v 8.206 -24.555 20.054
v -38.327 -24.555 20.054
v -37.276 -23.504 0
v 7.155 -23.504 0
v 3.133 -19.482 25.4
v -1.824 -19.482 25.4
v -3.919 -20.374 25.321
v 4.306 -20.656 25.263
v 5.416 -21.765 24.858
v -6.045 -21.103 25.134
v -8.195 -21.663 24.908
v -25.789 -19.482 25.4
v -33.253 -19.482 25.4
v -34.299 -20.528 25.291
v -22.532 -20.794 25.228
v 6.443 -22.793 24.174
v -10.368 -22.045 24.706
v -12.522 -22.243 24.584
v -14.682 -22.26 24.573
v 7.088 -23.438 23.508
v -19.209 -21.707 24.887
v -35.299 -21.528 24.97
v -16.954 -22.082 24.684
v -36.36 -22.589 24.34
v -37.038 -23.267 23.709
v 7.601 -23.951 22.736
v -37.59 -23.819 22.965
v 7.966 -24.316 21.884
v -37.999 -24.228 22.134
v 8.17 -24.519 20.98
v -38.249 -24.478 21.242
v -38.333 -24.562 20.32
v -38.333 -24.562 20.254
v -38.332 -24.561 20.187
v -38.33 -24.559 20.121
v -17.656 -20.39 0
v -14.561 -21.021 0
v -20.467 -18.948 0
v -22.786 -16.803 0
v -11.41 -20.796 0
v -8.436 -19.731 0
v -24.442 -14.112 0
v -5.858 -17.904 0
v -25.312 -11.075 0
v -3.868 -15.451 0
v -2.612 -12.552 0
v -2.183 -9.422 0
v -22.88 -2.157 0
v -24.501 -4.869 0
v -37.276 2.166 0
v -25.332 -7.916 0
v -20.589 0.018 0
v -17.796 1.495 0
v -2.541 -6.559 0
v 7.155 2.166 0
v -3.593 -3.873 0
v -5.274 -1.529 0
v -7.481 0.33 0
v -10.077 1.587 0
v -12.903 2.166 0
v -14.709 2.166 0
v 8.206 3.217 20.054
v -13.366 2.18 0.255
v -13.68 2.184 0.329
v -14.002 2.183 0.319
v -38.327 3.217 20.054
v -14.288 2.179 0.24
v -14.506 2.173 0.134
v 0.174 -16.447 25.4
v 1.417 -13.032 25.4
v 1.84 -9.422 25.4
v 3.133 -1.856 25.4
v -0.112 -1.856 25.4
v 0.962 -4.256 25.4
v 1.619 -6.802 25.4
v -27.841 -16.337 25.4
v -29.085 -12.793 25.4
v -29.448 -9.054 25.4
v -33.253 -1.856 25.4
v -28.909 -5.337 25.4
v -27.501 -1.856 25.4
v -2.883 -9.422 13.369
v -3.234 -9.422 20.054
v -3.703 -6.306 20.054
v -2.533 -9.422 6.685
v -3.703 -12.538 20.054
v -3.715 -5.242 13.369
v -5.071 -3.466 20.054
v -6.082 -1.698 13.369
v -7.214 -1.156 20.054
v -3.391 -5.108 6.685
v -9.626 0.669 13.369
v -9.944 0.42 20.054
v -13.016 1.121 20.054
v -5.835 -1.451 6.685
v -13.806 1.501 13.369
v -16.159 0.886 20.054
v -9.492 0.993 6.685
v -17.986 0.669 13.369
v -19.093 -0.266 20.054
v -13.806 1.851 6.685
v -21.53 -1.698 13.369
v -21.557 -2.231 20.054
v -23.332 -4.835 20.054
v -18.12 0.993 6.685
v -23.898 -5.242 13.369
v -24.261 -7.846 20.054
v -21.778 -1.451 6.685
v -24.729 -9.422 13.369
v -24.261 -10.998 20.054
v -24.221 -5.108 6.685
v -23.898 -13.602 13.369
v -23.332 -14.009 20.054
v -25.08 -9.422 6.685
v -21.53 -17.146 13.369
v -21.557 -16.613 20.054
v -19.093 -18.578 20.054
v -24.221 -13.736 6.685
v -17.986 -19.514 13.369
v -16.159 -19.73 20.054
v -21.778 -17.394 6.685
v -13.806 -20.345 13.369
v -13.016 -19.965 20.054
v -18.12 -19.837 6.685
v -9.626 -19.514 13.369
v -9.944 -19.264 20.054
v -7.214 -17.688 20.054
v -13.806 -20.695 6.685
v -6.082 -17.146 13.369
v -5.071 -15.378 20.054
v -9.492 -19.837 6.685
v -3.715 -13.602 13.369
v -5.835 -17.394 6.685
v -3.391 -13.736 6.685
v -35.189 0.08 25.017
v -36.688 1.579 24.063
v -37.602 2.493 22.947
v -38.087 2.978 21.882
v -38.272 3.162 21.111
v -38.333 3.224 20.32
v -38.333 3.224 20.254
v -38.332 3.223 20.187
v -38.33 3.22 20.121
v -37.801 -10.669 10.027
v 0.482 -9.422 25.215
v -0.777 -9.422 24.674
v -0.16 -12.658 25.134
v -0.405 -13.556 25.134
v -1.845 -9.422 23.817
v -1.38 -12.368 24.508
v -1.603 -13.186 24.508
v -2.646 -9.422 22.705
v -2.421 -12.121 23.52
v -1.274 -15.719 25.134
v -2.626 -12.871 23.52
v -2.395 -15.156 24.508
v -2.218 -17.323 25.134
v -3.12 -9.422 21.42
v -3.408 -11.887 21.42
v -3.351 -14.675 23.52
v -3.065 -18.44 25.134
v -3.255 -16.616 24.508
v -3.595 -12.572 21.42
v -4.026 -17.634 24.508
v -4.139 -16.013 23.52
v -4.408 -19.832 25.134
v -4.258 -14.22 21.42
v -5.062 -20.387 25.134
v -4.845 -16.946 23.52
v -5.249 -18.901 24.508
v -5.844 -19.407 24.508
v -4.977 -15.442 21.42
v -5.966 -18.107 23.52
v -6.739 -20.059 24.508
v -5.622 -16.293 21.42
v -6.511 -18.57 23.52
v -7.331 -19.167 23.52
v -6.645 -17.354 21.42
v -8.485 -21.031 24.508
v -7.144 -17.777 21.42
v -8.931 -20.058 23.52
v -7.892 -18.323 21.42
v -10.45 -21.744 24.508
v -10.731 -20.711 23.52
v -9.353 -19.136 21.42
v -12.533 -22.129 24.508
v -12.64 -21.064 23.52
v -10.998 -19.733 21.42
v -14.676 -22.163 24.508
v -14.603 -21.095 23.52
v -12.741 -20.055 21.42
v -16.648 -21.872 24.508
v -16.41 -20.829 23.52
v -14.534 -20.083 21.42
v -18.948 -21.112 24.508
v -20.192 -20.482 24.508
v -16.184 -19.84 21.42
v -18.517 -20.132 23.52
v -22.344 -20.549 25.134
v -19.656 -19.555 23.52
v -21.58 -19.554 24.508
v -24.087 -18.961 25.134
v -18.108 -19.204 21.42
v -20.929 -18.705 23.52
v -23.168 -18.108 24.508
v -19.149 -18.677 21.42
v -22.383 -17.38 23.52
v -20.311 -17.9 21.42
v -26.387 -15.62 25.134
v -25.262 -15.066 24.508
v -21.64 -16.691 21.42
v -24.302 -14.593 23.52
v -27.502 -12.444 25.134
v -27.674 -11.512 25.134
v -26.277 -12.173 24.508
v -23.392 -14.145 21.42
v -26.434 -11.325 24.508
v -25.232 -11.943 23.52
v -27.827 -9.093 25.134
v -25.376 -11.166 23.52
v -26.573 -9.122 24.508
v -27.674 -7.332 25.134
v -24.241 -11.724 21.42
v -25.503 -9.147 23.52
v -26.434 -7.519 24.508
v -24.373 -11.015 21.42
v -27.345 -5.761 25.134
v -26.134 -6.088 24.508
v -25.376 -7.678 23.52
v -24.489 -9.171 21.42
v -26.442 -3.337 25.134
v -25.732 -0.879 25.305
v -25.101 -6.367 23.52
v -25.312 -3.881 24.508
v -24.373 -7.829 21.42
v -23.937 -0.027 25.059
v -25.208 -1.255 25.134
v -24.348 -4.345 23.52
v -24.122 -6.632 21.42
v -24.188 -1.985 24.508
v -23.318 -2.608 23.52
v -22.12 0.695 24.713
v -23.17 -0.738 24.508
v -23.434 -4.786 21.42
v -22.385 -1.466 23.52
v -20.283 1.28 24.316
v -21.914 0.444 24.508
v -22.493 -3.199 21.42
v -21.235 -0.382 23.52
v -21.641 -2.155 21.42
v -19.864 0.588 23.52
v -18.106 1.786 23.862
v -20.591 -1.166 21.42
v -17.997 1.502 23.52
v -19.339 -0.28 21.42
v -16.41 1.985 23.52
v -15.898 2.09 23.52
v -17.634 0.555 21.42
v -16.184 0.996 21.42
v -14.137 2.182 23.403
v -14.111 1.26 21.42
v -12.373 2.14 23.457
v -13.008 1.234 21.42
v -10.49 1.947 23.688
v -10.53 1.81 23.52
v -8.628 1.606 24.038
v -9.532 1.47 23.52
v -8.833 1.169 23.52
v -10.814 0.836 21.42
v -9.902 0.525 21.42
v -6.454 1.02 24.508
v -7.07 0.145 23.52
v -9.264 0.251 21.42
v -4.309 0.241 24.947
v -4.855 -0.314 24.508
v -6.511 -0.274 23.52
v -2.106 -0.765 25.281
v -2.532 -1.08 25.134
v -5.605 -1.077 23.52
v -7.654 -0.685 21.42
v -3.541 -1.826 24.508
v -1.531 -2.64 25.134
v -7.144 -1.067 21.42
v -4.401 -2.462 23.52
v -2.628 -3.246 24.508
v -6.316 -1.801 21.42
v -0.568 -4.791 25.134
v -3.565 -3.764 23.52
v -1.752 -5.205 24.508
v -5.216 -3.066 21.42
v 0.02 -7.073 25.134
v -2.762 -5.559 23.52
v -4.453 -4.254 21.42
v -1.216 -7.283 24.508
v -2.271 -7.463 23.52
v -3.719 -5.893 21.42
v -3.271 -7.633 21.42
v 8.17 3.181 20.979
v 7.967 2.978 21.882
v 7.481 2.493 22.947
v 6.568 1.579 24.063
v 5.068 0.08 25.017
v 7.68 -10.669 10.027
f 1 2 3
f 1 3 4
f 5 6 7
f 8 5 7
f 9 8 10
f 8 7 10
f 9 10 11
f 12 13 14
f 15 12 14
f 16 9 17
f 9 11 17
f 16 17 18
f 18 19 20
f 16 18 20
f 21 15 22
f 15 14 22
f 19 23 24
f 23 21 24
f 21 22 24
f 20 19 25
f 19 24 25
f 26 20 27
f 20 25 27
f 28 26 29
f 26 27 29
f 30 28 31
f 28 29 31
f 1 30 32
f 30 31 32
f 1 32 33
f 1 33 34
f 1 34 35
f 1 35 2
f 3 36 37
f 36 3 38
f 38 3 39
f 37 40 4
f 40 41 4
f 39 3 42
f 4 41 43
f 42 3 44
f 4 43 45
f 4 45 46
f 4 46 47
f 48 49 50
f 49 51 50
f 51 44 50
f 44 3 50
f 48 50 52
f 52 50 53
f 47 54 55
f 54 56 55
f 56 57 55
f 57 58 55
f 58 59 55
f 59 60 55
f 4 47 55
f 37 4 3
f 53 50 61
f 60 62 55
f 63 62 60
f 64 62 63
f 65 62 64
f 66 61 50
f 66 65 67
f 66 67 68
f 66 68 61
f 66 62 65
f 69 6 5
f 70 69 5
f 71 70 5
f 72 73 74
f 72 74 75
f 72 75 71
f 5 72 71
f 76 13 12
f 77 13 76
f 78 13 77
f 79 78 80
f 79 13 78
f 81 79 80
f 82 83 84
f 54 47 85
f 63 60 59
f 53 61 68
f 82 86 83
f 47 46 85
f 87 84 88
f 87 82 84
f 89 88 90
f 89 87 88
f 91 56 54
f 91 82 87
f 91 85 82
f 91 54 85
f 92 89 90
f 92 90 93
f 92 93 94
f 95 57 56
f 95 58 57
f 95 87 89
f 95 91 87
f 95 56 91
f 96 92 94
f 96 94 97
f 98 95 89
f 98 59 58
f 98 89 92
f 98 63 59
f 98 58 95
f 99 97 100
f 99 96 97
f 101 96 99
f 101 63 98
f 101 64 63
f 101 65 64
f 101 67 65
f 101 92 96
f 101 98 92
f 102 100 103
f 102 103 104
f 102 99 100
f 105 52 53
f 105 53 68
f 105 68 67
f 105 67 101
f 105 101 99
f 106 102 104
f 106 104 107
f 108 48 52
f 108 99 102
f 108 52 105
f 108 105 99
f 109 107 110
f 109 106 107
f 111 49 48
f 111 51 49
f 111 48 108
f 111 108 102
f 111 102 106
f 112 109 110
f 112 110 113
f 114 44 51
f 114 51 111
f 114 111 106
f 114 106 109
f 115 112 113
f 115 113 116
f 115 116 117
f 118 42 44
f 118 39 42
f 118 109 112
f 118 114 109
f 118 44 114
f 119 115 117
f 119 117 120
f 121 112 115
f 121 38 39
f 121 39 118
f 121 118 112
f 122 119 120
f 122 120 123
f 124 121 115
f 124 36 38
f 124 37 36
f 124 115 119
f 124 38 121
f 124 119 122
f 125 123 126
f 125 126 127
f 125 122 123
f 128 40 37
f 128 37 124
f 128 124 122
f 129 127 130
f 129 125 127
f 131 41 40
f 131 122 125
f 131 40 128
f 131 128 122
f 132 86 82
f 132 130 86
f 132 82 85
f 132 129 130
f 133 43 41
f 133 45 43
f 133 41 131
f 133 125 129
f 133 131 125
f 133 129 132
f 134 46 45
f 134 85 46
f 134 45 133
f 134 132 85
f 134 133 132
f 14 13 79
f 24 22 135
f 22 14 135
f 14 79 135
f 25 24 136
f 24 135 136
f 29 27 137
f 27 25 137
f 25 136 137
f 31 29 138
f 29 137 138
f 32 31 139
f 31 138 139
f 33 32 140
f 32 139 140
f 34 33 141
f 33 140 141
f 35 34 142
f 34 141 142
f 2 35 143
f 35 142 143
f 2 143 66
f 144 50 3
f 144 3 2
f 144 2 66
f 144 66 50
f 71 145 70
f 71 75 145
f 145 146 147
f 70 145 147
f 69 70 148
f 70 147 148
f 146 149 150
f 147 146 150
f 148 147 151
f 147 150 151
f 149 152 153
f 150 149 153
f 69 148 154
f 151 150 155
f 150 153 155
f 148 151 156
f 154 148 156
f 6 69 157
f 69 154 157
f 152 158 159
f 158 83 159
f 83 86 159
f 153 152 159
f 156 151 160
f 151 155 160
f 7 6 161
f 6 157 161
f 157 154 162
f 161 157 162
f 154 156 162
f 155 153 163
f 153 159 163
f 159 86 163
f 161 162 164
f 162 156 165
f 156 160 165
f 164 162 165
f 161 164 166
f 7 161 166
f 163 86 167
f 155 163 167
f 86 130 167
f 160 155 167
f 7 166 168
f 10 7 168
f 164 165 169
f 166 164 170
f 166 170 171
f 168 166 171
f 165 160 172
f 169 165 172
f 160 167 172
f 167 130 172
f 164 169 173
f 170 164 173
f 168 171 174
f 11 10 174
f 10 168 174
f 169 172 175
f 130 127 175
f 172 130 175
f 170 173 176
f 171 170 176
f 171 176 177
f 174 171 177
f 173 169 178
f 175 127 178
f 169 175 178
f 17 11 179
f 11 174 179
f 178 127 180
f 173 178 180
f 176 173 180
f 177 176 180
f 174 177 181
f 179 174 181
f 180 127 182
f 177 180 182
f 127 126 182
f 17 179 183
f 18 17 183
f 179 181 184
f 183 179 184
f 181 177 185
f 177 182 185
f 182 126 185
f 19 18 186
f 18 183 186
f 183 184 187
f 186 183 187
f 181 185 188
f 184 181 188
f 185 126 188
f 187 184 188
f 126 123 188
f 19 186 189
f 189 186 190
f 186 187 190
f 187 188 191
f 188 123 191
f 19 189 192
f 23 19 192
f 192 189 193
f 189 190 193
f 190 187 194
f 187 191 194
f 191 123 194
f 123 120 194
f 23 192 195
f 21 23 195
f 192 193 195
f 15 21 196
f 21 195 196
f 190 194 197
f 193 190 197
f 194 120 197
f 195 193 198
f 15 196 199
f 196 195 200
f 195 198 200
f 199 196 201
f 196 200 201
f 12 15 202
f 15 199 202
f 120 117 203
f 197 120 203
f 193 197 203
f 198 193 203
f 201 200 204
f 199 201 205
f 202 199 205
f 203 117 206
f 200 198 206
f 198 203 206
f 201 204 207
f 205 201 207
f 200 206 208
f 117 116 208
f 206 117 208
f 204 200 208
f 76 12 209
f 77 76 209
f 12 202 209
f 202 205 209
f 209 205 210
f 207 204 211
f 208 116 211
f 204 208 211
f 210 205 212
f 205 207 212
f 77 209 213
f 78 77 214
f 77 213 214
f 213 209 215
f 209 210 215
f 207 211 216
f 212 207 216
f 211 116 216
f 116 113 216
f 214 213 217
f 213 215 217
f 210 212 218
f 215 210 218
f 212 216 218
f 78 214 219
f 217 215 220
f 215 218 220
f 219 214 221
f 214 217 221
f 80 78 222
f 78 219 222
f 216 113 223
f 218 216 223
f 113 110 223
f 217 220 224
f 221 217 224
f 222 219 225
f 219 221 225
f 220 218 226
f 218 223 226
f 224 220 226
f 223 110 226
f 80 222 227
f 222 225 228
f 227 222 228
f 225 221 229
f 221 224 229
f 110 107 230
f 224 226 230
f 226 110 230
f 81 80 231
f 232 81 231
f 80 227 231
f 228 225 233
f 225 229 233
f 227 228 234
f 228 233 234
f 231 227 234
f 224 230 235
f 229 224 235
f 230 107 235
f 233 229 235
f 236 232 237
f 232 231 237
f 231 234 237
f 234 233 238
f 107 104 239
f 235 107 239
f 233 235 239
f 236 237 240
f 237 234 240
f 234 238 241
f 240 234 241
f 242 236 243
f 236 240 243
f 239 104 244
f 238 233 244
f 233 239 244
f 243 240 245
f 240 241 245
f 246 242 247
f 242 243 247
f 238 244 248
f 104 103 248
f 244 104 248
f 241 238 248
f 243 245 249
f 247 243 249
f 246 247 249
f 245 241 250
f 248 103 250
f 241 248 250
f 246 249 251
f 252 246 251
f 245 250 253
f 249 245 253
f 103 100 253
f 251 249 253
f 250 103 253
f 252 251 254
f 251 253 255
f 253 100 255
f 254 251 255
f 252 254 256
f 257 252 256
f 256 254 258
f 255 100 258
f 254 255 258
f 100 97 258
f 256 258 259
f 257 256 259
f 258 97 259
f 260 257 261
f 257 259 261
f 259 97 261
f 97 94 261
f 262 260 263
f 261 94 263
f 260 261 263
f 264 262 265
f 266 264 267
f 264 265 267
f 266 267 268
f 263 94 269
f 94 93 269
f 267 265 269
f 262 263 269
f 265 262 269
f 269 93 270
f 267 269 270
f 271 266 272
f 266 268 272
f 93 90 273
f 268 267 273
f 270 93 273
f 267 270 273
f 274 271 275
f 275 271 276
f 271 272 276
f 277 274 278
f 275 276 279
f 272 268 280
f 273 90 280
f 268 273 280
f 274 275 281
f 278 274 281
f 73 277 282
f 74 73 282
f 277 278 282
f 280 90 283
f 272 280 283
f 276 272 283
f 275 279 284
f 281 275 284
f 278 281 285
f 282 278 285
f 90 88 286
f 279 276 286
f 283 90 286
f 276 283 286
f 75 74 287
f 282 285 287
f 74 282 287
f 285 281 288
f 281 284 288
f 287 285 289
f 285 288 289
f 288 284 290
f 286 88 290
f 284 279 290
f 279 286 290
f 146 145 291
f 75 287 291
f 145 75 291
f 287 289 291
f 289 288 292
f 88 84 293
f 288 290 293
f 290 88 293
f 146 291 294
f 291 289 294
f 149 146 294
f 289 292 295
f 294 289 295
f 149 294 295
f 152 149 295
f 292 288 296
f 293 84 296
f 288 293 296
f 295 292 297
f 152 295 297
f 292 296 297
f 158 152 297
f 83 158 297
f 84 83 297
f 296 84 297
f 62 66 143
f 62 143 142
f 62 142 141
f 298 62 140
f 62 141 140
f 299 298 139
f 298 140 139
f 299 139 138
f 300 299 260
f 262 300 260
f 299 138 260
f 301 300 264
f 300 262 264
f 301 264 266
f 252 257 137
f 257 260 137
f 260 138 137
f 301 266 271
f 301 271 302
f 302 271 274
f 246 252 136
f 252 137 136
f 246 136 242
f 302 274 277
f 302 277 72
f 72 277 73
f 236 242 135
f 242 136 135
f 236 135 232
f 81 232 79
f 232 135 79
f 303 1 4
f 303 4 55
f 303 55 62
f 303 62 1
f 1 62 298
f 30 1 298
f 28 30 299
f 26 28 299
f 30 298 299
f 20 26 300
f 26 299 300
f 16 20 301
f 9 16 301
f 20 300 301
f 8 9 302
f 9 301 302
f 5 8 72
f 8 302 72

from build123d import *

# Parameters (mm, degrees)
F0_W        = 44.4304826669
F0_H        = 25.670937961
F1_DEPTH    = 25.4
F1_TAPER    = -3
F2_R        = 10.2925338698
F3_DEPTH    = 25.4
F3_TAPER    = -3
F4_T1_DEPTH = 73.8588130367
F4_T3_DEPTH = 55.0992683307


# Not quite as in the source:
# - a fillet or chamfer that OpenCascade refuses, or shapes differently, is made with other operations: its cross-section is extruded or revolved along the edge and cut away or added


with BuildPart() as f1:
    # F0 (on Top) → F1 (new body)
    with BuildSketch(Plane.XY):
        with Locations((-15.0602816138, -10.6690136017)):
            Rectangle(F0_W, F0_H)
    extrude(amount=F1_DEPTH, taper=F1_TAPER)

    # F2 (on face) → F3 (cut)
    with BuildSketch(Plane.XY.offset(25.4)):
        with Locations((-13.8062266633, -9.4221020117)):
            Circle(F2_R)
    extrude(amount=-F3_DEPTH, taper=F3_TAPER, mode=Mode.SUBTRACT)

    # F4: fillet of radius 5.08 on 5 edges, made by hand

    # F4_s2 → F4_t1 (cut)
    with BuildSketch(Plane.YZ.offset(-51.9896881322)):
        with BuildLine():
            ThreePointArc((-19.4824371396, 25.4), (-23.1673389443, 23.8168412445), (-24.5554751761, 20.0541333423))
            Line((-24.5554751761, 20.0541333423), (-24.835640176, 25.4))
            Line((-24.835640176, 25.4), (-19.4824371396, 25.4))
        make_face()
        with BuildLine():
            ThreePointArc((3.2174479727, 20.0541333423), (1.8293117409, 23.8168412445), (-1.8555900639, 25.4))
            Line((-1.8555900639, 25.4), (3.4976129725, 25.4))
            Line((3.4976129725, 25.4), (3.2174479727, 20.0541333423))
        make_face()
    extrude(amount=F4_T1_DEPTH, mode=Mode.SUBTRACT)

    # F4_s4 → F4_t3 (cut)
    with BuildSketch(Plane.XZ.offset(-16.8806205636)):
        with BuildLine():
            ThreePointArc((8.2059523135, 20.0541333423), (6.8178160817, 23.8168412445), (3.132914277, 25.4))
            Line((3.132914277, 25.4), (8.4861173134, 25.4))
            Line((8.4861173134, 25.4), (8.2059523135, 20.0541333423))
        make_face()
        with BuildLine():
            ThreePointArc((-33.2534775047, 25.4), (-36.9383793094, 23.8168412445), (-38.3265155412, 20.0541333423))
            Line((-38.3265155412, 20.0541333423), (-38.6066805411, 25.4))
            Line((-38.6066805411, 25.4), (-33.2534775047, 25.4))
        make_face()
    extrude(amount=F4_T3_DEPTH, mode=Mode.SUBTRACT)

    # F4_s5 → F4_t6 (revolve, cut)
    with BuildSketch(Plane.XZ.offset(9.4221020117)):
        with BuildLine():
            ThreePointArc((1.8395102429, 25.4), (-1.8453915618, 23.8168412445), (-3.2335277936, 20.0541333423))
            Line((-3.2335277936, 20.0541333423), (-3.5136927935, 25.4))
            Line((-3.5136927935, 25.4), (1.8395102429, 25.4))
        make_face()
    revolve(axis=Axis((-13.8062266633, -9.4221020117, 25.4), (0, 0, -1)), mode=Mode.SUBTRACT)


solid = f1.part
